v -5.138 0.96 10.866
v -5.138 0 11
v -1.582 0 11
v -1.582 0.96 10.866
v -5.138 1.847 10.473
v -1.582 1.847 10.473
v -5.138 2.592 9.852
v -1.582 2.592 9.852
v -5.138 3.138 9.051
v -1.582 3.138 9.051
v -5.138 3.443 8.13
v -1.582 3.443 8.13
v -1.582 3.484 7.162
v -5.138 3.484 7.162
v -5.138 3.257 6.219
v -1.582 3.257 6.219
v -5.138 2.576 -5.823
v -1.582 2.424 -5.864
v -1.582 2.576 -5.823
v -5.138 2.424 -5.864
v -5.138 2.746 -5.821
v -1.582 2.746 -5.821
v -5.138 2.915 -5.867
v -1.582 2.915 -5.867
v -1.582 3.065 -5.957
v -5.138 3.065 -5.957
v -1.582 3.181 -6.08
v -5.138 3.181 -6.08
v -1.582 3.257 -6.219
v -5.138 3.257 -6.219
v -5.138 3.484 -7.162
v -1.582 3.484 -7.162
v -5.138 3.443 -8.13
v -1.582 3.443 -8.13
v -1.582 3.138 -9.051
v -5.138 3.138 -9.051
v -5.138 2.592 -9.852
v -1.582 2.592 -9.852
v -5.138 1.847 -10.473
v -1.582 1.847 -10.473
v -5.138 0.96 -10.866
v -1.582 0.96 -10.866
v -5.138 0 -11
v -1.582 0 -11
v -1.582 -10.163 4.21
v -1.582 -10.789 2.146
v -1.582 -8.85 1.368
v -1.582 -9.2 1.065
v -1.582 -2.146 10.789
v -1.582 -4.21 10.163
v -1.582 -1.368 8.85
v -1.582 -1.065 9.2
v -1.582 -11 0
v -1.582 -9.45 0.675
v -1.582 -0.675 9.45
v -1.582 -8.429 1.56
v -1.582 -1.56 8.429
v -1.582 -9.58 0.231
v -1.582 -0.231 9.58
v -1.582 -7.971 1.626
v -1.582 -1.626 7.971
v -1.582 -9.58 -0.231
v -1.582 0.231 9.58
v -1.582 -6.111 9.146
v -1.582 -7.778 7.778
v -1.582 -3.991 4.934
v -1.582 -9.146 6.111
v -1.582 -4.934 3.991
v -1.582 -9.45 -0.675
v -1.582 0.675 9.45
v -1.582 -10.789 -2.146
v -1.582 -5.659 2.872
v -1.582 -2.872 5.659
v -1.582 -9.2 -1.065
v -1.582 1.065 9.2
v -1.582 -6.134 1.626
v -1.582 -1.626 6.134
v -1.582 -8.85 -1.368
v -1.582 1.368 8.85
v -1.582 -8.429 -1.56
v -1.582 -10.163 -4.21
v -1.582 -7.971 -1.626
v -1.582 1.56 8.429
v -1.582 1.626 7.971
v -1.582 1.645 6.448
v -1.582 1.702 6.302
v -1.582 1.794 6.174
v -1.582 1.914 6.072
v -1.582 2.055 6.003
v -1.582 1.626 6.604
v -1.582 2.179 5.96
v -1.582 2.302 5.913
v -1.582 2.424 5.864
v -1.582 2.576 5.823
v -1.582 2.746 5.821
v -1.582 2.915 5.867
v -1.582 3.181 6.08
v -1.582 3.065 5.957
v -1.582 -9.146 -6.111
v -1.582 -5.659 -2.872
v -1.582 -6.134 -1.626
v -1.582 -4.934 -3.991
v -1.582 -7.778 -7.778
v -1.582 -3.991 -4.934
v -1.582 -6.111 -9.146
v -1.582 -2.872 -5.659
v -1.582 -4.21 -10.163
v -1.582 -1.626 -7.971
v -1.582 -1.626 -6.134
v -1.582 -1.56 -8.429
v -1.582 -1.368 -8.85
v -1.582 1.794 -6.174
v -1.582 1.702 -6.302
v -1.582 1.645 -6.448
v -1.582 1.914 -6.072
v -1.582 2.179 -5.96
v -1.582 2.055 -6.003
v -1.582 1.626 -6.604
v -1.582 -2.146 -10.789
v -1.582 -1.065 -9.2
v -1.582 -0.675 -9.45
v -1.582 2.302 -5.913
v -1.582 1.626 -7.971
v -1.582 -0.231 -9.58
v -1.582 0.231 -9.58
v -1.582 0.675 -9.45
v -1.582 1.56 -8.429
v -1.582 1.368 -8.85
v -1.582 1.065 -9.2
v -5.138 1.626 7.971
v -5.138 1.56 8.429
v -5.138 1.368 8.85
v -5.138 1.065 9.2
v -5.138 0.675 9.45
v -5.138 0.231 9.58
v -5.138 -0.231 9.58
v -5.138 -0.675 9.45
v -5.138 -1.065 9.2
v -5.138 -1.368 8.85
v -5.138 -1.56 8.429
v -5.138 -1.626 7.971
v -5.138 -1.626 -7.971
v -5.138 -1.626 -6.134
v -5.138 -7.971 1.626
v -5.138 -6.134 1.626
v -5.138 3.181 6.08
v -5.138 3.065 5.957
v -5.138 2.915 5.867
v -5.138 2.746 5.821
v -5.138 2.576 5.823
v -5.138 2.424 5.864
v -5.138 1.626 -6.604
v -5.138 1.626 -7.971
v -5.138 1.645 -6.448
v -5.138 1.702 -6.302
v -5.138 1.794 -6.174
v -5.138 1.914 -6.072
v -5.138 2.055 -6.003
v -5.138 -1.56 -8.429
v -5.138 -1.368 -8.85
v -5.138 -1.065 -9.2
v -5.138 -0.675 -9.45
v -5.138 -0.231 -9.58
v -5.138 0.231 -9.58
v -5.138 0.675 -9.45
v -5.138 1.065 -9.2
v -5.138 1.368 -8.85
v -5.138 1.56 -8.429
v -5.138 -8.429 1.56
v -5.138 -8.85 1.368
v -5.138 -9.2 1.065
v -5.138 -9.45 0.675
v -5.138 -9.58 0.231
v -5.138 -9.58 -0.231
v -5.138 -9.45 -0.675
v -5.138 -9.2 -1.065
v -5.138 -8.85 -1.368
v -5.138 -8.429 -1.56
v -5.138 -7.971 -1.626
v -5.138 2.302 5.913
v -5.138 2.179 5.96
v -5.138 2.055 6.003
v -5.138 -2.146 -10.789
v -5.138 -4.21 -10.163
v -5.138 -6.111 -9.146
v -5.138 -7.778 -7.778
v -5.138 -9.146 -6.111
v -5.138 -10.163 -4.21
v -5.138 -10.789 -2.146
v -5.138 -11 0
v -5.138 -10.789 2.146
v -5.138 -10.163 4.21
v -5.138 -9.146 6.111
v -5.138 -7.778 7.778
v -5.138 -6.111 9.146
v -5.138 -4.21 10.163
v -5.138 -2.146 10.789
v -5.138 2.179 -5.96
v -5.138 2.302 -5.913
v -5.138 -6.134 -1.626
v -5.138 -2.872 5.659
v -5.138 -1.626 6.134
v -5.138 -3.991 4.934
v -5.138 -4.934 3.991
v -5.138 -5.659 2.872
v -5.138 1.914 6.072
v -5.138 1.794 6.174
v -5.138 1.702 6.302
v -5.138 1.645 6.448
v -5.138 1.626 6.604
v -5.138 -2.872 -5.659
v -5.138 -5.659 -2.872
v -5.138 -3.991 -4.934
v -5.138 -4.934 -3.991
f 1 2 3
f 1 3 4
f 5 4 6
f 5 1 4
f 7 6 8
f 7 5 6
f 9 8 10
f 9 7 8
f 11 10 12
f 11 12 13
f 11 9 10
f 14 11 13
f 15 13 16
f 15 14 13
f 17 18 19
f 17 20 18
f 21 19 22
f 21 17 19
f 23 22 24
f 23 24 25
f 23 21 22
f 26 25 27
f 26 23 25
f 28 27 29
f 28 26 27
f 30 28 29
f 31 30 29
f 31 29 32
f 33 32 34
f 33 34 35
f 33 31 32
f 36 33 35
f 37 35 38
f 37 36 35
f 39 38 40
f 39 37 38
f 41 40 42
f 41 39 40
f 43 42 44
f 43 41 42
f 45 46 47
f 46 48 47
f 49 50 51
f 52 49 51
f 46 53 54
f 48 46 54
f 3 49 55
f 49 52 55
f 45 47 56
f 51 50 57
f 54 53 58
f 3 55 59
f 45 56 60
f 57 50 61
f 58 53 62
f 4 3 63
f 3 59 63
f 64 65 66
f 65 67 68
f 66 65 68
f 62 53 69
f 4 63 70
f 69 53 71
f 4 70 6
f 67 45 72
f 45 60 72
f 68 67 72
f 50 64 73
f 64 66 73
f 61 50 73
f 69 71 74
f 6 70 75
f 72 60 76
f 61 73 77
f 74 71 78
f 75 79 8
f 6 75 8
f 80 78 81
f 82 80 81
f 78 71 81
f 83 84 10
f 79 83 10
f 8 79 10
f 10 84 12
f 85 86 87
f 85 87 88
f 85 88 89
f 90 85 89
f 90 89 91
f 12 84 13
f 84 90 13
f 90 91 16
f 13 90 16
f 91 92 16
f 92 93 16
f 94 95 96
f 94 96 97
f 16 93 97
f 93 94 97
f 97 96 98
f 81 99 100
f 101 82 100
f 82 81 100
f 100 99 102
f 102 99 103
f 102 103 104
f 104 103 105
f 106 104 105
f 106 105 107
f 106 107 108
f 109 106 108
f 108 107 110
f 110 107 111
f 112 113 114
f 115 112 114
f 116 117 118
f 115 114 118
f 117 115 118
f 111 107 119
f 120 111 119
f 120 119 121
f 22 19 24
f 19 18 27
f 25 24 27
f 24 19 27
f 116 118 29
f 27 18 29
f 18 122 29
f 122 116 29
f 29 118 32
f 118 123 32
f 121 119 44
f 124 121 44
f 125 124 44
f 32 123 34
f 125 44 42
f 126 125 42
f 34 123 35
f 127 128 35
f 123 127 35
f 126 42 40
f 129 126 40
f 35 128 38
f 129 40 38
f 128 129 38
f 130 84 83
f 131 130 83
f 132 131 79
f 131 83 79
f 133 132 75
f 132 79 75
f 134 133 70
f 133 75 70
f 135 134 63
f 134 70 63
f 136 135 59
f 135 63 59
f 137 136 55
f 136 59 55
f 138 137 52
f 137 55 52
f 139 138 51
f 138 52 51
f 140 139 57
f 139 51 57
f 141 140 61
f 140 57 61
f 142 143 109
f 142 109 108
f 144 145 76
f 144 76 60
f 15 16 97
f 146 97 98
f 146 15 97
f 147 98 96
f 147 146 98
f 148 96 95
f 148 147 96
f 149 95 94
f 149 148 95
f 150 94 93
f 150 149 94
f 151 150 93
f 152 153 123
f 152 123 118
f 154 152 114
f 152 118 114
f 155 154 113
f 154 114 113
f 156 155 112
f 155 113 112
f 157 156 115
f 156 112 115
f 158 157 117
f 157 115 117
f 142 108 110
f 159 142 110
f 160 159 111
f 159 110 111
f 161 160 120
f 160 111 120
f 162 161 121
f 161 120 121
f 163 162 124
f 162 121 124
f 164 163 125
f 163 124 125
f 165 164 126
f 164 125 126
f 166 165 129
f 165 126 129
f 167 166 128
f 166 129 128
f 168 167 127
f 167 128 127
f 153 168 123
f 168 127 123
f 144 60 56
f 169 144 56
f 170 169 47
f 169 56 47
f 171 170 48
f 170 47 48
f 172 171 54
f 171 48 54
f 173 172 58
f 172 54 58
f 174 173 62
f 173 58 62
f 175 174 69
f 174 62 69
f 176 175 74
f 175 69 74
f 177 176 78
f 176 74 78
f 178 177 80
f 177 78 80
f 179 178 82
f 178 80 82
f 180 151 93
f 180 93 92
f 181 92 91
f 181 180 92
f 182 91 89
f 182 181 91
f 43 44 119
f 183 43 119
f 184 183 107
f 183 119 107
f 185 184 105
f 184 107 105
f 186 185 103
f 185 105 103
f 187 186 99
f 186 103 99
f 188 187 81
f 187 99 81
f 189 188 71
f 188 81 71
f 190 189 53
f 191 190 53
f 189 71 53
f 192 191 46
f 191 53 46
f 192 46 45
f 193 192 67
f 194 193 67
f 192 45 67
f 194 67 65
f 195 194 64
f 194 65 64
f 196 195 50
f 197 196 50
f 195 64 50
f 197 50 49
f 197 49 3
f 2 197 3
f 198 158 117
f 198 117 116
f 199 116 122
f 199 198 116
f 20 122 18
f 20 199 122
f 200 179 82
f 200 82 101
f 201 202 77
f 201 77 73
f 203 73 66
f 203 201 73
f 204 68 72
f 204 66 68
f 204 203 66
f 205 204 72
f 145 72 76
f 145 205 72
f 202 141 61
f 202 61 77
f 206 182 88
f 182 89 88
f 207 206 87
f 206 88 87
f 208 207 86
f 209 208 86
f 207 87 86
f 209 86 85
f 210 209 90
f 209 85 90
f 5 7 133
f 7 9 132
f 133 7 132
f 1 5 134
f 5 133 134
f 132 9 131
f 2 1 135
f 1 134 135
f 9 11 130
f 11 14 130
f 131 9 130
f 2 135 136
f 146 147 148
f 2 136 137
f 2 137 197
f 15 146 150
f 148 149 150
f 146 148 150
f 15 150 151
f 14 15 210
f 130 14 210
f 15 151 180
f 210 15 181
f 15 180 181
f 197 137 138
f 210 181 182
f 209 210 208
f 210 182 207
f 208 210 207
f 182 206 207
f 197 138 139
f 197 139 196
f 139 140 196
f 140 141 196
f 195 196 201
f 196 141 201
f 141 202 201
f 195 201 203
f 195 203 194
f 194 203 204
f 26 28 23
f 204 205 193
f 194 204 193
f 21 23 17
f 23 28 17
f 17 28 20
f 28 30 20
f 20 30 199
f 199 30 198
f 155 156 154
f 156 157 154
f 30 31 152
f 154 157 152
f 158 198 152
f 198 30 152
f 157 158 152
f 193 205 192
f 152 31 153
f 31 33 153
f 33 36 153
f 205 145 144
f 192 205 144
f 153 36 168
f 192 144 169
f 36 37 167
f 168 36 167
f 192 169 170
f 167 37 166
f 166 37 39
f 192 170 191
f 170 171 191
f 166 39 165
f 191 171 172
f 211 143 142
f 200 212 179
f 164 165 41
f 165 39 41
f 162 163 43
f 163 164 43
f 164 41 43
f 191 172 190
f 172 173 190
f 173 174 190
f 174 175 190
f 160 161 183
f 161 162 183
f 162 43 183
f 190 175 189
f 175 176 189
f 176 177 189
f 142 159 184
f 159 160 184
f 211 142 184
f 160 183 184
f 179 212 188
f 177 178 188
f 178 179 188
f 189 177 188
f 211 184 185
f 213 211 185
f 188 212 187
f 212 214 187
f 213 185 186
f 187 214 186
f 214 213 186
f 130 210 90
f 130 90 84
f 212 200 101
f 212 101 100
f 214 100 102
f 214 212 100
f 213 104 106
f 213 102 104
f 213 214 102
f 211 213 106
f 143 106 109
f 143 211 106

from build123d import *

# Parameters (mm, degrees)
SKETCH2_R          = 1.6256
CUT_EXTRUDE1_DEPTH = 3.556
CIRPATTERN1_COUNT  = 4
CUT_EXTRUDE2_DEPTH = 3.556
SKETCH4_R          = 4.99999
CUT_EXTRUDE3_DEPTH = 10
CUT_EXTRUDE4_DEPTH = 3.556
SKETCH6_R          = 5.08
CUT_EXTRUDE5_DEPTH = 1.5824
CUT_EXTRUDE6_DEPTH = 4.556
FILLET1_R          = 0.635


with BuildPart() as part:
    # Sketch1 → Revolve1 (revolve)
    with BuildSketch(Plane.XY):
        Polygon((-15.1384, 4.99999), (-5.1384, 4.99999), (-5.1384, 11), (-1.5824, 11), (-1.5824, 5.08), (0, 5.08), (0, 4), (-15.1384, 4), align=None)
    revolve(axis=Axis((0, 0, 0), (-1, 0, 0)))

    # Sketch2 → Cut-Extrude1 (cut)
    with BuildSketch(Plane(origin=(-1.5824, 0, 0), x_dir=(0, 0, -1), z_dir=(1, 0, 0))):
        with Locations((0, 7.97105)):
            Circle(SKETCH2_R)
    cut_extrude1 = extrude(amount=-CUT_EXTRUDE1_DEPTH, mode=Mode.SUBTRACT)

    # CirPattern1: Cut-Extrude1 ×4 about axis
    cirpattern1_axis = Axis((0, 0, 0), (1, 0, 0))
    for i in range(1, CIRPATTERN1_COUNT):
        add(cut_extrude1.rotate(cirpattern1_axis, i * 360 / CIRPATTERN1_COUNT), mode=Mode.SUBTRACT)

    # Sketch3 → Cut-Extrude2 (cut)
    with BuildSketch(Plane(origin=(-1.5824, 0, 0), x_dir=(0, 0, -1), z_dir=(1, 0, 0))):
        with BuildLine():
            Line((-4.215969639, 10.16), (4.215969639, 10.16))
            ThreePointArc((4.215969639, 10.16), (0, 11), (-4.215969639, 10.16))
        make_face()
    extrude(amount=-CUT_EXTRUDE2_DEPTH, mode=Mode.SUBTRACT)

    # Sketch4 → Cut-Extrude3 (cut)
    with BuildSketch(Plane.ZY.offset(15.1384)):
        Circle(SKETCH4_R)
    extrude(amount=-CUT_EXTRUDE3_DEPTH, mode=Mode.SUBTRACT)

    # Sketch5 → Cut-Extrude4 (cut)
    with BuildSketch(Plane.ZY.offset(5.1384)):
        with BuildLine():
            ThreePointArc((-4, 0), (-7.5, 3.5), (-11, 0))
            ThreePointArc((-11, 0), (0, 11), (11, 0))
            ThreePointArc((11, 0), (7.5, 3.5), (4, 0))
            ThreePointArc((4, 0), (0, 4), (-4, 0))
        make_face()
    extrude(amount=-CUT_EXTRUDE4_DEPTH, mode=Mode.SUBTRACT)

    # Sketch6 → Cut-Extrude5 (cut)
    with BuildSketch(Plane(origin=(0, 0, 0), x_dir=(0, 0, -1), z_dir=(1, 0, 0))):
        Circle(SKETCH6_R)
    extrude(amount=-CUT_EXTRUDE5_DEPTH, mode=Mode.SUBTRACT)

    # Sketch7 → Cut-Extrude6 (cut, through all)
    with BuildSketch(Plane.ZY.offset(5.1384)):
        with BuildLine():
            Line((-7.97105, 1.6256), (-6.133690597, 1.6256))
            ThreePointArc((-6.133690597, 1.6256), (0, 6.34545), (6.133690597, 1.6256))
            Line((6.133690597, 1.6256), (7.97105, 1.6256))
            ThreePointArc((7.97105, 1.6256), (6.34545, 0), (7.97105, -1.6256))
            Line((7.97105, -1.6256), (6.133690597, -1.6256))
            ThreePointArc((6.133690597, -1.6256), (4.486910725, -4.486910725), (1.6256, -6.133690597))
            Line((1.6256, -6.133690597), (1.6256, -7.97105))
            ThreePointArc((1.6256, -7.97105), (0, -6.34545), (-1.6256, -7.97105))
            Line((-1.6256, -7.97105), (-1.6256, -6.133690597))
            ThreePointArc((-1.6256, -6.133690597), (-4.486910725, -4.486910725), (-6.133690597, -1.6256))
            Line((-6.133690597, -1.6256), (-7.97105, -1.6256))
            ThreePointArc((-7.97105, -1.6256), (-6.34545, 0), (-7.97105, 1.6256))
        make_face()
    extrude(amount=-CUT_EXTRUDE6_DEPTH, mode=Mode.SUBTRACT)

    # Fillet1
    fillet1_edges = [part.edges().sort_by_distance(p)[0] for p in [
        (-3.3604, 2.95072108, 5.617649047),
        (-3.3604, 1.6256, -6.133690597),
        (-3.3604, 1.6256, 6.133690597),
        (-3.3604, 2.95072108, -5.617649047),
    ]]
    fillet(fillet1_edges, radius=FILLET1_R)


solid = part.part
